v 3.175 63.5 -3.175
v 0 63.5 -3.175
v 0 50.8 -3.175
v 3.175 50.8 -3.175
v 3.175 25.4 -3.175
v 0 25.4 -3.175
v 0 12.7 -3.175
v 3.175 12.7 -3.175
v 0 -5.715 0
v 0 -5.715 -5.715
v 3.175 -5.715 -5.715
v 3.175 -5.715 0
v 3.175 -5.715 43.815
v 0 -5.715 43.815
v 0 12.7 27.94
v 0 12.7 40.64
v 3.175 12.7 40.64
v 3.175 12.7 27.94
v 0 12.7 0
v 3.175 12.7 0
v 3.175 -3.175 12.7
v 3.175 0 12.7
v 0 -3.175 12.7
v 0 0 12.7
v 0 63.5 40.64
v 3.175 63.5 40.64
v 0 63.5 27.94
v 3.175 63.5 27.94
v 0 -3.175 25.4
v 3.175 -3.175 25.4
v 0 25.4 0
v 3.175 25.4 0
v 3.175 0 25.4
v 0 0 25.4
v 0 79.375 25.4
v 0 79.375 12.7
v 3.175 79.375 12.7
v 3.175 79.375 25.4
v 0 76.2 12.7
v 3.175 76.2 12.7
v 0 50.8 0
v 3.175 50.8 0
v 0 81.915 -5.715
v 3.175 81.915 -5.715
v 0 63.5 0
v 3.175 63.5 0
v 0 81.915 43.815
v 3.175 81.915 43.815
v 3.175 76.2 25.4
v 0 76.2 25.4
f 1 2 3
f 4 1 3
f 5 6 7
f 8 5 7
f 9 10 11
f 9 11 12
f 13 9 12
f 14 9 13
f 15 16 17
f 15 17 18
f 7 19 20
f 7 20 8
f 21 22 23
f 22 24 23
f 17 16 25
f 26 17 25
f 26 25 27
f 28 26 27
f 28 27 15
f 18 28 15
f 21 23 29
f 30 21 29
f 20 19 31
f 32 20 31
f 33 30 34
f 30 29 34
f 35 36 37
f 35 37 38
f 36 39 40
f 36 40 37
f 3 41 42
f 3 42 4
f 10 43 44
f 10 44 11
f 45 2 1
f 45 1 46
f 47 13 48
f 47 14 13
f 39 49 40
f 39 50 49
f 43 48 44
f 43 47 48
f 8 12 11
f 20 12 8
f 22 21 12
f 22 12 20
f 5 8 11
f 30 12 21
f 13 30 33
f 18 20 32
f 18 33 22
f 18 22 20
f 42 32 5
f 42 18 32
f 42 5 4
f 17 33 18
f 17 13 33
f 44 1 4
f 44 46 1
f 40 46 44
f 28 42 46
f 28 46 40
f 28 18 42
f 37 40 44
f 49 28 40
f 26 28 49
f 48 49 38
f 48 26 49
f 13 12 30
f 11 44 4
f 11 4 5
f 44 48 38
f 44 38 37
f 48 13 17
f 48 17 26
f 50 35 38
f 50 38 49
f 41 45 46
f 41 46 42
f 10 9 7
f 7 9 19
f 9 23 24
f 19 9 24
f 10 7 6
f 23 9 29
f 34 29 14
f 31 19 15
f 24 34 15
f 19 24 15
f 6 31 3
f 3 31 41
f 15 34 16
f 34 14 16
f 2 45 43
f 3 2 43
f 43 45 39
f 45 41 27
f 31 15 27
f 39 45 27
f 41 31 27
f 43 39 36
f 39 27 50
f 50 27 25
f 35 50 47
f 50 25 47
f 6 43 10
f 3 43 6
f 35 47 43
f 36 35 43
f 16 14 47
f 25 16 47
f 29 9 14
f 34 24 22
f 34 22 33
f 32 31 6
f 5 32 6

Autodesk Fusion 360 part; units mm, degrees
sketch "Sketch1" plane through (0, 0, 0) normal (1, 0, 0) x (0, 1, 0)
  line L0 (25.4, 0) -> (25.4, -3.175)
  line L1 (12.7, 0) -> (12.7, -3.175)
  line L2 (76.2, 25.4) -> (76.2, 12.7)
  line L3 (0, 0) -> (0, 25.4)
  line L4 (0, 12.7) -> (-3.175, 12.7)
  line L5 (76.2, 12.7) -> (79.375, 12.7)
  line L6 (-3.175, 25.4) -> (0, 25.4)
  line L7 (63.5, -3.175) -> (63.5, 0)
  line L8 (50.8, 0) -> (50.8, -3.175)
  line L9 (79.375, 12.7) -> (79.375, 25.4)
  line L10 (0, -3.175) -> (0, 0)
  line L11 (0, 0) -> (0, 12.7)
  line L12 (25.4, -3.175) -> (38.1, -3.175)
  line L13 (-3.175, 12.7) -> (-3.175, 25.4)
  line L14 (79.375, 25.4) -> (76.2, 25.4)
  line L15 (0, 0) -> (-7.62, 0)
  line L16 (0, 0) -> (-5.715, 0)
  line L17 (-5.715, 0) -> (-5.715, 38.1)
  line L18 (-5.715, 38.1) -> (-5.715, 43.815)
  line L19 (-5.715, 43.815) -> (76.2, 43.815)
  line L20 (76.2, 43.815) -> (81.915, 43.815)
  line L21 (81.915, 43.815) -> (81.915, 0)
  line L22 (81.915, 0) -> (81.915, -5.715)
  line L23 (81.915, -5.715) -> (0, -5.715)
  line L24 (0, -5.715) -> (-5.715, -5.715)
  line L25 (-5.715, -5.715) -> (-5.715, 0)
  line L26 (-5.715, 43.815) -> (12.7, 43.815)
  line L27 (12.7, 43.815) -> (12.7, 40.64)
  line L28 (12.7, 40.64) -> (12.7, 27.94)
  line L29 (81.915, 43.815) -> (63.5, 43.815)
  line L30 (63.5, 43.815) -> (63.5, 27.94)
  line L31 (63.5, 27.94) -> (12.7, 27.94)
  line L32 (12.7, 40.64) -> (63.5, 40.64)
  line L33 (63.5, -3.175) -> (50.8, -3.175)
  line L34 (63.5, 0) -> (50.8, 0)
  line L35 (25.4, -3.175) -> (12.7, -3.175)
  line L36 (12.7, 0) -> (25.4, 0)
  dimension "d2" = 12.7
  dimension "d3" = 3.175
  dimension "d4" = 12.7
  dimension "d6" = 12.7
  dimension "d9" = 12.7
  dimension "d10" = 3.175
  dimension "d12" = 12.7
  dimension "d13" = 3.175
  dimension "d14" = 12.7
  dimension "d16" = 3.175
  dimension "d17" = 12.7
  dimension "d18" = 7.62
  dimension "d21" = 5.715
  dimension "d22" = 5.715
  dimension "d23" = 5.715
  dimension "d24" = 5.715
  dimension "d25" = 3.175
  dimension "d26" = 12.7
  dimension "d27" = 18.415
extrude "Extrude1" add sketch "Sketch1" along normal blind 3.175 contours L17 L18 L19 L20 L21 L22 L23 L24 L25 L26 L27 L28 L29 L30 L31 | L19 L27 L30 L32
